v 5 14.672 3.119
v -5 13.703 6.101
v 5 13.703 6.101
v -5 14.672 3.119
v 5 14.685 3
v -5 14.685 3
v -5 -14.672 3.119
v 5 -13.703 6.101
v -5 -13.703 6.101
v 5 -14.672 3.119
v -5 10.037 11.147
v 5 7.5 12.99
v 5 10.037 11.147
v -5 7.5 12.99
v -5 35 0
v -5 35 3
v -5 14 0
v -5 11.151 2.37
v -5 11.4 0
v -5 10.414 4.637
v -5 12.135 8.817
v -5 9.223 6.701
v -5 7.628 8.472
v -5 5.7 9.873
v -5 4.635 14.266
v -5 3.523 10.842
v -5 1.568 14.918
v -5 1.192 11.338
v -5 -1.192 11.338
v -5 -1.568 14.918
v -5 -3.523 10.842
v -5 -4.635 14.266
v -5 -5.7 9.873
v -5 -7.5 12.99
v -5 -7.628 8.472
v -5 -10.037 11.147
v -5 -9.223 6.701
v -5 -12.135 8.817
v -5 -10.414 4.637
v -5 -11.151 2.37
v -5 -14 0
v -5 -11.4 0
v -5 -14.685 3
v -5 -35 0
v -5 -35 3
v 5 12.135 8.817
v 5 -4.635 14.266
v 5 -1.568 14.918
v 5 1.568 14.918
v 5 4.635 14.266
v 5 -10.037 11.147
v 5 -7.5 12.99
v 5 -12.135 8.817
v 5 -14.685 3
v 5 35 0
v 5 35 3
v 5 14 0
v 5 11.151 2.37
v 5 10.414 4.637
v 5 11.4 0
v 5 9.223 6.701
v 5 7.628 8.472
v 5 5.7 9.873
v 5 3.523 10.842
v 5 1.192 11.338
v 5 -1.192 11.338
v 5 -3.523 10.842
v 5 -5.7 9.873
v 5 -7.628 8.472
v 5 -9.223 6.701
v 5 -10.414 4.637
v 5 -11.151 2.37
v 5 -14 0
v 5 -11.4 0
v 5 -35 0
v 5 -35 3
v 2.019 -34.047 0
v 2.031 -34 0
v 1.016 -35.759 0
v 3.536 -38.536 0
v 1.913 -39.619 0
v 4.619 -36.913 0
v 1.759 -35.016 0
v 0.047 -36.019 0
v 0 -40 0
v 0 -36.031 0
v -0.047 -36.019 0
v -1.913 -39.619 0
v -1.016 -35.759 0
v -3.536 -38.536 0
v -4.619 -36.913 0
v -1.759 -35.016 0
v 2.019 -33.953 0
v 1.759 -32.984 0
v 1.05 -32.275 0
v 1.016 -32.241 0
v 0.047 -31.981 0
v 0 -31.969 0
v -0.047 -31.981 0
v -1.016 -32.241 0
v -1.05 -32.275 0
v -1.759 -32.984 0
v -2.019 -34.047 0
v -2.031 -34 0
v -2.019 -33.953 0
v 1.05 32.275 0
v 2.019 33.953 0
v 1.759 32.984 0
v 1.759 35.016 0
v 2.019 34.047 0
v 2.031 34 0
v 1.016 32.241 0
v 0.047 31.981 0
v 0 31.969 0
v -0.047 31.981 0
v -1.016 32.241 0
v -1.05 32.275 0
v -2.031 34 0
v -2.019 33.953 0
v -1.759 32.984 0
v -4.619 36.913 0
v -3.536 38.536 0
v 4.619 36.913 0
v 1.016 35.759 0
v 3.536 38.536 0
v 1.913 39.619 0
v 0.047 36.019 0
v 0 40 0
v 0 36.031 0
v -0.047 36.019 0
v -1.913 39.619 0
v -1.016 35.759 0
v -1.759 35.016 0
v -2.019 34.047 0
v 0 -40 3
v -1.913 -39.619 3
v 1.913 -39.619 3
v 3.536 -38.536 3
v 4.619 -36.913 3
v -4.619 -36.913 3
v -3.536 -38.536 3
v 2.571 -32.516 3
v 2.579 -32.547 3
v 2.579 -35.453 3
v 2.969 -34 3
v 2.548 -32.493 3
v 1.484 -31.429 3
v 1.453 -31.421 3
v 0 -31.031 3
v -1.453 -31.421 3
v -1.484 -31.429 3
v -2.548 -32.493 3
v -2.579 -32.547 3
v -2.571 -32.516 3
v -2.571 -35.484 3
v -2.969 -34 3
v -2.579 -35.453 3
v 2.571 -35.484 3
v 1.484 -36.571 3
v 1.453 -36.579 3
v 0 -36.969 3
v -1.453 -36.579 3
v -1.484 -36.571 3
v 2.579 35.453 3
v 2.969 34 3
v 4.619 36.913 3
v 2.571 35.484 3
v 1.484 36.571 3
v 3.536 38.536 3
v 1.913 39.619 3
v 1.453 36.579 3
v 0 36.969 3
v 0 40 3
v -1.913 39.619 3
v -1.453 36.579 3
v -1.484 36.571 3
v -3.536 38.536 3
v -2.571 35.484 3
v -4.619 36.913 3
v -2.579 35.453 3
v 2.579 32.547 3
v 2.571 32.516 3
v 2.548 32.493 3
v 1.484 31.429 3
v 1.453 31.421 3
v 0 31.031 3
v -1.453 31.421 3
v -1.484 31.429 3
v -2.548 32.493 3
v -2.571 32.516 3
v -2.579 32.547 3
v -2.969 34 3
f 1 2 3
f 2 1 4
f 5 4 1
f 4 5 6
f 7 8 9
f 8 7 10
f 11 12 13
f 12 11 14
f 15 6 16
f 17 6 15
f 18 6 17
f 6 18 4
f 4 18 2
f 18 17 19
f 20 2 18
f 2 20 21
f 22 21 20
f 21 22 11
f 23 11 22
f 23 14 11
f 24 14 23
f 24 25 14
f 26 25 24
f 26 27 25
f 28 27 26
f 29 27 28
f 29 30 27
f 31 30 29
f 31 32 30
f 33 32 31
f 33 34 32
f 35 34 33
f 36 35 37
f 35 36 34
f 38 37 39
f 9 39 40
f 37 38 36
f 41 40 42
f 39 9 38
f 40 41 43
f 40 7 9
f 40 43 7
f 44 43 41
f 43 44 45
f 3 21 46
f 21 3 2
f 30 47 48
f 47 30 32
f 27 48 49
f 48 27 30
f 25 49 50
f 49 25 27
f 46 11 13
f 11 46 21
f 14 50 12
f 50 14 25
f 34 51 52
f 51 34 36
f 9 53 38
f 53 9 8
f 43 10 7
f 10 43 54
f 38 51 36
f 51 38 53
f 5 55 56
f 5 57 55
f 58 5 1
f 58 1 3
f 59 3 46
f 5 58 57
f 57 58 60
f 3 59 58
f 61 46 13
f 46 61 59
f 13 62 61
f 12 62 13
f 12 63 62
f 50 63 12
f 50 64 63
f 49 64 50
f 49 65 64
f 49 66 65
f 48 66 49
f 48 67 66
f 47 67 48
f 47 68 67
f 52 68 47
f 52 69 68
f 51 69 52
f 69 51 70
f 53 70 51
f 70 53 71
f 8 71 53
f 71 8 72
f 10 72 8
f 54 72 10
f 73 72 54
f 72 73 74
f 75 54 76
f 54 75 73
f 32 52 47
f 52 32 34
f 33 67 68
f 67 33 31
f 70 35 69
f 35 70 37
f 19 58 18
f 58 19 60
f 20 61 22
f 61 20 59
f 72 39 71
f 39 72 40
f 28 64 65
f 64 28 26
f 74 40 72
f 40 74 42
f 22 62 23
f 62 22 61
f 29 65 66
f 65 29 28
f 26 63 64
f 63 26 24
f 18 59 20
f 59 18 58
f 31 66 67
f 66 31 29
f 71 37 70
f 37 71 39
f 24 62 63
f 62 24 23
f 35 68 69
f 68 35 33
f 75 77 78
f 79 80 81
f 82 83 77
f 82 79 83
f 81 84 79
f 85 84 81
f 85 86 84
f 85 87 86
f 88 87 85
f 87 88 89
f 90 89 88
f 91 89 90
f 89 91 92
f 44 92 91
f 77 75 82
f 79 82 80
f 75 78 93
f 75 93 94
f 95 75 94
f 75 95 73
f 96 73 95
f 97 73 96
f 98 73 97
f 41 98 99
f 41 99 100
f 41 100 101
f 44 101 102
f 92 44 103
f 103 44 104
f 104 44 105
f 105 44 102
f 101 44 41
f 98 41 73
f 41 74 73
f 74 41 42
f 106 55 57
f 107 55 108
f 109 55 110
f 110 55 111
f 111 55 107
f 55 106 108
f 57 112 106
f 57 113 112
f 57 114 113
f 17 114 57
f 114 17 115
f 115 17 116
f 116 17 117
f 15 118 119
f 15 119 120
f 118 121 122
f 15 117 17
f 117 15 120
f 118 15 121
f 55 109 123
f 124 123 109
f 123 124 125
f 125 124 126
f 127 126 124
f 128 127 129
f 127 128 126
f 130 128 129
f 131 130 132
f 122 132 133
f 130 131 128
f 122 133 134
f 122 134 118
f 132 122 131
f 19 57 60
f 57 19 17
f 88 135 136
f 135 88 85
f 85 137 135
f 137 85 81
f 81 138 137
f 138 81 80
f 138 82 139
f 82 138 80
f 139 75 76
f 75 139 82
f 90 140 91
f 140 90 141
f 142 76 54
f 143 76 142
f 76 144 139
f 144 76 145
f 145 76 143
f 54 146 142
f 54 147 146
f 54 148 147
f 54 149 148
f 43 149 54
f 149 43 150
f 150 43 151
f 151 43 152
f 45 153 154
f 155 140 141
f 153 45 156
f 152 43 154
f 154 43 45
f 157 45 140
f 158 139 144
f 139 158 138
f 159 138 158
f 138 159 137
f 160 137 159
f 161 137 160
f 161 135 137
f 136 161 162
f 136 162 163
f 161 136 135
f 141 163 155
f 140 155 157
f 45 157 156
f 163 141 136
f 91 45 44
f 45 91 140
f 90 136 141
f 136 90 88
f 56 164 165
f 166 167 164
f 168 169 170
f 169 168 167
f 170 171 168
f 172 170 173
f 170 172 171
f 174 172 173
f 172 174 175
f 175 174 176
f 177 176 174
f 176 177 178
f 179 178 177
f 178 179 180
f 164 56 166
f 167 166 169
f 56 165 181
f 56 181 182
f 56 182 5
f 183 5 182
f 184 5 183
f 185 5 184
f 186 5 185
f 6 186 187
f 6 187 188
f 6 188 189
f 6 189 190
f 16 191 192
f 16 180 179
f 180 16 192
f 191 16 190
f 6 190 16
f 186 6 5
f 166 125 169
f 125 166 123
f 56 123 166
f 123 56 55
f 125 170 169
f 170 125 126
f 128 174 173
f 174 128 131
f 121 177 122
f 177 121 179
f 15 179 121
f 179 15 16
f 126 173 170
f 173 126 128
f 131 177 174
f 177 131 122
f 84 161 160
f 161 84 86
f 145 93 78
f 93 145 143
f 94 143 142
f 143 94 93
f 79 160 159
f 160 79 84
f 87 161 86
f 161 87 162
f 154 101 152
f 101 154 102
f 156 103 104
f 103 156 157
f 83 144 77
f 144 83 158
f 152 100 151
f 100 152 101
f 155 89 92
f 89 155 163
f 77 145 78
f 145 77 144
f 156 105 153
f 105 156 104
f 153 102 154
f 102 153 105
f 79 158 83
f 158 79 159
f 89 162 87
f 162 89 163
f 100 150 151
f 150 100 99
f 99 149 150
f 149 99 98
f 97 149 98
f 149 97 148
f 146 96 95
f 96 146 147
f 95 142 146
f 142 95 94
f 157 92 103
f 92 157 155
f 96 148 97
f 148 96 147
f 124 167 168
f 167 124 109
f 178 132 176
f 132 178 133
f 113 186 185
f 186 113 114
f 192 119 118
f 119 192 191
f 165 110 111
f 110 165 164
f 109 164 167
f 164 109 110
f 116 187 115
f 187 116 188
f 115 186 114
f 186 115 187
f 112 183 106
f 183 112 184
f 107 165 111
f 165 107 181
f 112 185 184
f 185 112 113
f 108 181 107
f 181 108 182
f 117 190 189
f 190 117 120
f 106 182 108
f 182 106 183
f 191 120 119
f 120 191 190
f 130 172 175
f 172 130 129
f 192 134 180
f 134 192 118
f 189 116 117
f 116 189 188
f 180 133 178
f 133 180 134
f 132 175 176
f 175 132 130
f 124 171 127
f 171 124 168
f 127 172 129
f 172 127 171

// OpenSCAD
/* Cable Strap  - Loic Septemeber 2017 */

// ToDo: More work

height = 3;
depth = 10;

loop_length = 30;
bracket_length = 20;

with_screw_holes = true;

screw_hole_top_depth = 6;
screw_hole_bottom_depth = 4;

//////////
radius = depth / 2;




difference()
{
cable_strap_base();

if(with_screw_holes)
    {
    translate([0,-bracket_length-loop_length/2 +1,-0.1])
      color("red")
      cylinder(height+0.2,screw_hole_bottom_depth/2,screw_hole_top_depth/2,$fn=12);
    
    translate([0,bracket_length + loop_length/2 - 1,-0.1])
      color("red")
      cylinder(height+0.2,screw_hole_bottom_depth/2,screw_hole_top_depth/2,$fn=12);
    }
}



// Helper Modules
module cable_strap_base()
{
    bob = bracket_length + loop_length/2;
    translate([0,-bob,0])
    {
        cylinder(height,radius,radius);
        translate([-depth/2,0,0])
            cube([depth,bracket_length+1,height]);
        
        translate([0,bracket_length+(loop_length/2)])
        {
        rotate([-90,0,90])
            half_ring(loop_length/2,loop_length/2-height*1.2,depth);   
        }
        
        translate([-depth/2,bracket_length+loop_length-1,0])
            cube([depth,bracket_length+1,height]);
        
        translate([0,2*bracket_length+loop_length,0])
            cylinder(height,radius,radius);
    }
}

module half_ring(outer_r,inner_r,depth)
{
    difference()
    {
    ring(outer_r,inner_r,depth);
    
    translate([0,outer_r/2,0])
        cube([2+outer_r*2,outer_r,depth*2],true);
    }
}

module ring(outer_r,inner_r,depth)
{
    translate([0,0,-depth/2])
    {
        difference()
        {
            cylinder(depth,outer_r,outer_r);
            translate([0,0,-2])
                cylinder(depth+4,inner_r,inner_r);
        }
    }
}
